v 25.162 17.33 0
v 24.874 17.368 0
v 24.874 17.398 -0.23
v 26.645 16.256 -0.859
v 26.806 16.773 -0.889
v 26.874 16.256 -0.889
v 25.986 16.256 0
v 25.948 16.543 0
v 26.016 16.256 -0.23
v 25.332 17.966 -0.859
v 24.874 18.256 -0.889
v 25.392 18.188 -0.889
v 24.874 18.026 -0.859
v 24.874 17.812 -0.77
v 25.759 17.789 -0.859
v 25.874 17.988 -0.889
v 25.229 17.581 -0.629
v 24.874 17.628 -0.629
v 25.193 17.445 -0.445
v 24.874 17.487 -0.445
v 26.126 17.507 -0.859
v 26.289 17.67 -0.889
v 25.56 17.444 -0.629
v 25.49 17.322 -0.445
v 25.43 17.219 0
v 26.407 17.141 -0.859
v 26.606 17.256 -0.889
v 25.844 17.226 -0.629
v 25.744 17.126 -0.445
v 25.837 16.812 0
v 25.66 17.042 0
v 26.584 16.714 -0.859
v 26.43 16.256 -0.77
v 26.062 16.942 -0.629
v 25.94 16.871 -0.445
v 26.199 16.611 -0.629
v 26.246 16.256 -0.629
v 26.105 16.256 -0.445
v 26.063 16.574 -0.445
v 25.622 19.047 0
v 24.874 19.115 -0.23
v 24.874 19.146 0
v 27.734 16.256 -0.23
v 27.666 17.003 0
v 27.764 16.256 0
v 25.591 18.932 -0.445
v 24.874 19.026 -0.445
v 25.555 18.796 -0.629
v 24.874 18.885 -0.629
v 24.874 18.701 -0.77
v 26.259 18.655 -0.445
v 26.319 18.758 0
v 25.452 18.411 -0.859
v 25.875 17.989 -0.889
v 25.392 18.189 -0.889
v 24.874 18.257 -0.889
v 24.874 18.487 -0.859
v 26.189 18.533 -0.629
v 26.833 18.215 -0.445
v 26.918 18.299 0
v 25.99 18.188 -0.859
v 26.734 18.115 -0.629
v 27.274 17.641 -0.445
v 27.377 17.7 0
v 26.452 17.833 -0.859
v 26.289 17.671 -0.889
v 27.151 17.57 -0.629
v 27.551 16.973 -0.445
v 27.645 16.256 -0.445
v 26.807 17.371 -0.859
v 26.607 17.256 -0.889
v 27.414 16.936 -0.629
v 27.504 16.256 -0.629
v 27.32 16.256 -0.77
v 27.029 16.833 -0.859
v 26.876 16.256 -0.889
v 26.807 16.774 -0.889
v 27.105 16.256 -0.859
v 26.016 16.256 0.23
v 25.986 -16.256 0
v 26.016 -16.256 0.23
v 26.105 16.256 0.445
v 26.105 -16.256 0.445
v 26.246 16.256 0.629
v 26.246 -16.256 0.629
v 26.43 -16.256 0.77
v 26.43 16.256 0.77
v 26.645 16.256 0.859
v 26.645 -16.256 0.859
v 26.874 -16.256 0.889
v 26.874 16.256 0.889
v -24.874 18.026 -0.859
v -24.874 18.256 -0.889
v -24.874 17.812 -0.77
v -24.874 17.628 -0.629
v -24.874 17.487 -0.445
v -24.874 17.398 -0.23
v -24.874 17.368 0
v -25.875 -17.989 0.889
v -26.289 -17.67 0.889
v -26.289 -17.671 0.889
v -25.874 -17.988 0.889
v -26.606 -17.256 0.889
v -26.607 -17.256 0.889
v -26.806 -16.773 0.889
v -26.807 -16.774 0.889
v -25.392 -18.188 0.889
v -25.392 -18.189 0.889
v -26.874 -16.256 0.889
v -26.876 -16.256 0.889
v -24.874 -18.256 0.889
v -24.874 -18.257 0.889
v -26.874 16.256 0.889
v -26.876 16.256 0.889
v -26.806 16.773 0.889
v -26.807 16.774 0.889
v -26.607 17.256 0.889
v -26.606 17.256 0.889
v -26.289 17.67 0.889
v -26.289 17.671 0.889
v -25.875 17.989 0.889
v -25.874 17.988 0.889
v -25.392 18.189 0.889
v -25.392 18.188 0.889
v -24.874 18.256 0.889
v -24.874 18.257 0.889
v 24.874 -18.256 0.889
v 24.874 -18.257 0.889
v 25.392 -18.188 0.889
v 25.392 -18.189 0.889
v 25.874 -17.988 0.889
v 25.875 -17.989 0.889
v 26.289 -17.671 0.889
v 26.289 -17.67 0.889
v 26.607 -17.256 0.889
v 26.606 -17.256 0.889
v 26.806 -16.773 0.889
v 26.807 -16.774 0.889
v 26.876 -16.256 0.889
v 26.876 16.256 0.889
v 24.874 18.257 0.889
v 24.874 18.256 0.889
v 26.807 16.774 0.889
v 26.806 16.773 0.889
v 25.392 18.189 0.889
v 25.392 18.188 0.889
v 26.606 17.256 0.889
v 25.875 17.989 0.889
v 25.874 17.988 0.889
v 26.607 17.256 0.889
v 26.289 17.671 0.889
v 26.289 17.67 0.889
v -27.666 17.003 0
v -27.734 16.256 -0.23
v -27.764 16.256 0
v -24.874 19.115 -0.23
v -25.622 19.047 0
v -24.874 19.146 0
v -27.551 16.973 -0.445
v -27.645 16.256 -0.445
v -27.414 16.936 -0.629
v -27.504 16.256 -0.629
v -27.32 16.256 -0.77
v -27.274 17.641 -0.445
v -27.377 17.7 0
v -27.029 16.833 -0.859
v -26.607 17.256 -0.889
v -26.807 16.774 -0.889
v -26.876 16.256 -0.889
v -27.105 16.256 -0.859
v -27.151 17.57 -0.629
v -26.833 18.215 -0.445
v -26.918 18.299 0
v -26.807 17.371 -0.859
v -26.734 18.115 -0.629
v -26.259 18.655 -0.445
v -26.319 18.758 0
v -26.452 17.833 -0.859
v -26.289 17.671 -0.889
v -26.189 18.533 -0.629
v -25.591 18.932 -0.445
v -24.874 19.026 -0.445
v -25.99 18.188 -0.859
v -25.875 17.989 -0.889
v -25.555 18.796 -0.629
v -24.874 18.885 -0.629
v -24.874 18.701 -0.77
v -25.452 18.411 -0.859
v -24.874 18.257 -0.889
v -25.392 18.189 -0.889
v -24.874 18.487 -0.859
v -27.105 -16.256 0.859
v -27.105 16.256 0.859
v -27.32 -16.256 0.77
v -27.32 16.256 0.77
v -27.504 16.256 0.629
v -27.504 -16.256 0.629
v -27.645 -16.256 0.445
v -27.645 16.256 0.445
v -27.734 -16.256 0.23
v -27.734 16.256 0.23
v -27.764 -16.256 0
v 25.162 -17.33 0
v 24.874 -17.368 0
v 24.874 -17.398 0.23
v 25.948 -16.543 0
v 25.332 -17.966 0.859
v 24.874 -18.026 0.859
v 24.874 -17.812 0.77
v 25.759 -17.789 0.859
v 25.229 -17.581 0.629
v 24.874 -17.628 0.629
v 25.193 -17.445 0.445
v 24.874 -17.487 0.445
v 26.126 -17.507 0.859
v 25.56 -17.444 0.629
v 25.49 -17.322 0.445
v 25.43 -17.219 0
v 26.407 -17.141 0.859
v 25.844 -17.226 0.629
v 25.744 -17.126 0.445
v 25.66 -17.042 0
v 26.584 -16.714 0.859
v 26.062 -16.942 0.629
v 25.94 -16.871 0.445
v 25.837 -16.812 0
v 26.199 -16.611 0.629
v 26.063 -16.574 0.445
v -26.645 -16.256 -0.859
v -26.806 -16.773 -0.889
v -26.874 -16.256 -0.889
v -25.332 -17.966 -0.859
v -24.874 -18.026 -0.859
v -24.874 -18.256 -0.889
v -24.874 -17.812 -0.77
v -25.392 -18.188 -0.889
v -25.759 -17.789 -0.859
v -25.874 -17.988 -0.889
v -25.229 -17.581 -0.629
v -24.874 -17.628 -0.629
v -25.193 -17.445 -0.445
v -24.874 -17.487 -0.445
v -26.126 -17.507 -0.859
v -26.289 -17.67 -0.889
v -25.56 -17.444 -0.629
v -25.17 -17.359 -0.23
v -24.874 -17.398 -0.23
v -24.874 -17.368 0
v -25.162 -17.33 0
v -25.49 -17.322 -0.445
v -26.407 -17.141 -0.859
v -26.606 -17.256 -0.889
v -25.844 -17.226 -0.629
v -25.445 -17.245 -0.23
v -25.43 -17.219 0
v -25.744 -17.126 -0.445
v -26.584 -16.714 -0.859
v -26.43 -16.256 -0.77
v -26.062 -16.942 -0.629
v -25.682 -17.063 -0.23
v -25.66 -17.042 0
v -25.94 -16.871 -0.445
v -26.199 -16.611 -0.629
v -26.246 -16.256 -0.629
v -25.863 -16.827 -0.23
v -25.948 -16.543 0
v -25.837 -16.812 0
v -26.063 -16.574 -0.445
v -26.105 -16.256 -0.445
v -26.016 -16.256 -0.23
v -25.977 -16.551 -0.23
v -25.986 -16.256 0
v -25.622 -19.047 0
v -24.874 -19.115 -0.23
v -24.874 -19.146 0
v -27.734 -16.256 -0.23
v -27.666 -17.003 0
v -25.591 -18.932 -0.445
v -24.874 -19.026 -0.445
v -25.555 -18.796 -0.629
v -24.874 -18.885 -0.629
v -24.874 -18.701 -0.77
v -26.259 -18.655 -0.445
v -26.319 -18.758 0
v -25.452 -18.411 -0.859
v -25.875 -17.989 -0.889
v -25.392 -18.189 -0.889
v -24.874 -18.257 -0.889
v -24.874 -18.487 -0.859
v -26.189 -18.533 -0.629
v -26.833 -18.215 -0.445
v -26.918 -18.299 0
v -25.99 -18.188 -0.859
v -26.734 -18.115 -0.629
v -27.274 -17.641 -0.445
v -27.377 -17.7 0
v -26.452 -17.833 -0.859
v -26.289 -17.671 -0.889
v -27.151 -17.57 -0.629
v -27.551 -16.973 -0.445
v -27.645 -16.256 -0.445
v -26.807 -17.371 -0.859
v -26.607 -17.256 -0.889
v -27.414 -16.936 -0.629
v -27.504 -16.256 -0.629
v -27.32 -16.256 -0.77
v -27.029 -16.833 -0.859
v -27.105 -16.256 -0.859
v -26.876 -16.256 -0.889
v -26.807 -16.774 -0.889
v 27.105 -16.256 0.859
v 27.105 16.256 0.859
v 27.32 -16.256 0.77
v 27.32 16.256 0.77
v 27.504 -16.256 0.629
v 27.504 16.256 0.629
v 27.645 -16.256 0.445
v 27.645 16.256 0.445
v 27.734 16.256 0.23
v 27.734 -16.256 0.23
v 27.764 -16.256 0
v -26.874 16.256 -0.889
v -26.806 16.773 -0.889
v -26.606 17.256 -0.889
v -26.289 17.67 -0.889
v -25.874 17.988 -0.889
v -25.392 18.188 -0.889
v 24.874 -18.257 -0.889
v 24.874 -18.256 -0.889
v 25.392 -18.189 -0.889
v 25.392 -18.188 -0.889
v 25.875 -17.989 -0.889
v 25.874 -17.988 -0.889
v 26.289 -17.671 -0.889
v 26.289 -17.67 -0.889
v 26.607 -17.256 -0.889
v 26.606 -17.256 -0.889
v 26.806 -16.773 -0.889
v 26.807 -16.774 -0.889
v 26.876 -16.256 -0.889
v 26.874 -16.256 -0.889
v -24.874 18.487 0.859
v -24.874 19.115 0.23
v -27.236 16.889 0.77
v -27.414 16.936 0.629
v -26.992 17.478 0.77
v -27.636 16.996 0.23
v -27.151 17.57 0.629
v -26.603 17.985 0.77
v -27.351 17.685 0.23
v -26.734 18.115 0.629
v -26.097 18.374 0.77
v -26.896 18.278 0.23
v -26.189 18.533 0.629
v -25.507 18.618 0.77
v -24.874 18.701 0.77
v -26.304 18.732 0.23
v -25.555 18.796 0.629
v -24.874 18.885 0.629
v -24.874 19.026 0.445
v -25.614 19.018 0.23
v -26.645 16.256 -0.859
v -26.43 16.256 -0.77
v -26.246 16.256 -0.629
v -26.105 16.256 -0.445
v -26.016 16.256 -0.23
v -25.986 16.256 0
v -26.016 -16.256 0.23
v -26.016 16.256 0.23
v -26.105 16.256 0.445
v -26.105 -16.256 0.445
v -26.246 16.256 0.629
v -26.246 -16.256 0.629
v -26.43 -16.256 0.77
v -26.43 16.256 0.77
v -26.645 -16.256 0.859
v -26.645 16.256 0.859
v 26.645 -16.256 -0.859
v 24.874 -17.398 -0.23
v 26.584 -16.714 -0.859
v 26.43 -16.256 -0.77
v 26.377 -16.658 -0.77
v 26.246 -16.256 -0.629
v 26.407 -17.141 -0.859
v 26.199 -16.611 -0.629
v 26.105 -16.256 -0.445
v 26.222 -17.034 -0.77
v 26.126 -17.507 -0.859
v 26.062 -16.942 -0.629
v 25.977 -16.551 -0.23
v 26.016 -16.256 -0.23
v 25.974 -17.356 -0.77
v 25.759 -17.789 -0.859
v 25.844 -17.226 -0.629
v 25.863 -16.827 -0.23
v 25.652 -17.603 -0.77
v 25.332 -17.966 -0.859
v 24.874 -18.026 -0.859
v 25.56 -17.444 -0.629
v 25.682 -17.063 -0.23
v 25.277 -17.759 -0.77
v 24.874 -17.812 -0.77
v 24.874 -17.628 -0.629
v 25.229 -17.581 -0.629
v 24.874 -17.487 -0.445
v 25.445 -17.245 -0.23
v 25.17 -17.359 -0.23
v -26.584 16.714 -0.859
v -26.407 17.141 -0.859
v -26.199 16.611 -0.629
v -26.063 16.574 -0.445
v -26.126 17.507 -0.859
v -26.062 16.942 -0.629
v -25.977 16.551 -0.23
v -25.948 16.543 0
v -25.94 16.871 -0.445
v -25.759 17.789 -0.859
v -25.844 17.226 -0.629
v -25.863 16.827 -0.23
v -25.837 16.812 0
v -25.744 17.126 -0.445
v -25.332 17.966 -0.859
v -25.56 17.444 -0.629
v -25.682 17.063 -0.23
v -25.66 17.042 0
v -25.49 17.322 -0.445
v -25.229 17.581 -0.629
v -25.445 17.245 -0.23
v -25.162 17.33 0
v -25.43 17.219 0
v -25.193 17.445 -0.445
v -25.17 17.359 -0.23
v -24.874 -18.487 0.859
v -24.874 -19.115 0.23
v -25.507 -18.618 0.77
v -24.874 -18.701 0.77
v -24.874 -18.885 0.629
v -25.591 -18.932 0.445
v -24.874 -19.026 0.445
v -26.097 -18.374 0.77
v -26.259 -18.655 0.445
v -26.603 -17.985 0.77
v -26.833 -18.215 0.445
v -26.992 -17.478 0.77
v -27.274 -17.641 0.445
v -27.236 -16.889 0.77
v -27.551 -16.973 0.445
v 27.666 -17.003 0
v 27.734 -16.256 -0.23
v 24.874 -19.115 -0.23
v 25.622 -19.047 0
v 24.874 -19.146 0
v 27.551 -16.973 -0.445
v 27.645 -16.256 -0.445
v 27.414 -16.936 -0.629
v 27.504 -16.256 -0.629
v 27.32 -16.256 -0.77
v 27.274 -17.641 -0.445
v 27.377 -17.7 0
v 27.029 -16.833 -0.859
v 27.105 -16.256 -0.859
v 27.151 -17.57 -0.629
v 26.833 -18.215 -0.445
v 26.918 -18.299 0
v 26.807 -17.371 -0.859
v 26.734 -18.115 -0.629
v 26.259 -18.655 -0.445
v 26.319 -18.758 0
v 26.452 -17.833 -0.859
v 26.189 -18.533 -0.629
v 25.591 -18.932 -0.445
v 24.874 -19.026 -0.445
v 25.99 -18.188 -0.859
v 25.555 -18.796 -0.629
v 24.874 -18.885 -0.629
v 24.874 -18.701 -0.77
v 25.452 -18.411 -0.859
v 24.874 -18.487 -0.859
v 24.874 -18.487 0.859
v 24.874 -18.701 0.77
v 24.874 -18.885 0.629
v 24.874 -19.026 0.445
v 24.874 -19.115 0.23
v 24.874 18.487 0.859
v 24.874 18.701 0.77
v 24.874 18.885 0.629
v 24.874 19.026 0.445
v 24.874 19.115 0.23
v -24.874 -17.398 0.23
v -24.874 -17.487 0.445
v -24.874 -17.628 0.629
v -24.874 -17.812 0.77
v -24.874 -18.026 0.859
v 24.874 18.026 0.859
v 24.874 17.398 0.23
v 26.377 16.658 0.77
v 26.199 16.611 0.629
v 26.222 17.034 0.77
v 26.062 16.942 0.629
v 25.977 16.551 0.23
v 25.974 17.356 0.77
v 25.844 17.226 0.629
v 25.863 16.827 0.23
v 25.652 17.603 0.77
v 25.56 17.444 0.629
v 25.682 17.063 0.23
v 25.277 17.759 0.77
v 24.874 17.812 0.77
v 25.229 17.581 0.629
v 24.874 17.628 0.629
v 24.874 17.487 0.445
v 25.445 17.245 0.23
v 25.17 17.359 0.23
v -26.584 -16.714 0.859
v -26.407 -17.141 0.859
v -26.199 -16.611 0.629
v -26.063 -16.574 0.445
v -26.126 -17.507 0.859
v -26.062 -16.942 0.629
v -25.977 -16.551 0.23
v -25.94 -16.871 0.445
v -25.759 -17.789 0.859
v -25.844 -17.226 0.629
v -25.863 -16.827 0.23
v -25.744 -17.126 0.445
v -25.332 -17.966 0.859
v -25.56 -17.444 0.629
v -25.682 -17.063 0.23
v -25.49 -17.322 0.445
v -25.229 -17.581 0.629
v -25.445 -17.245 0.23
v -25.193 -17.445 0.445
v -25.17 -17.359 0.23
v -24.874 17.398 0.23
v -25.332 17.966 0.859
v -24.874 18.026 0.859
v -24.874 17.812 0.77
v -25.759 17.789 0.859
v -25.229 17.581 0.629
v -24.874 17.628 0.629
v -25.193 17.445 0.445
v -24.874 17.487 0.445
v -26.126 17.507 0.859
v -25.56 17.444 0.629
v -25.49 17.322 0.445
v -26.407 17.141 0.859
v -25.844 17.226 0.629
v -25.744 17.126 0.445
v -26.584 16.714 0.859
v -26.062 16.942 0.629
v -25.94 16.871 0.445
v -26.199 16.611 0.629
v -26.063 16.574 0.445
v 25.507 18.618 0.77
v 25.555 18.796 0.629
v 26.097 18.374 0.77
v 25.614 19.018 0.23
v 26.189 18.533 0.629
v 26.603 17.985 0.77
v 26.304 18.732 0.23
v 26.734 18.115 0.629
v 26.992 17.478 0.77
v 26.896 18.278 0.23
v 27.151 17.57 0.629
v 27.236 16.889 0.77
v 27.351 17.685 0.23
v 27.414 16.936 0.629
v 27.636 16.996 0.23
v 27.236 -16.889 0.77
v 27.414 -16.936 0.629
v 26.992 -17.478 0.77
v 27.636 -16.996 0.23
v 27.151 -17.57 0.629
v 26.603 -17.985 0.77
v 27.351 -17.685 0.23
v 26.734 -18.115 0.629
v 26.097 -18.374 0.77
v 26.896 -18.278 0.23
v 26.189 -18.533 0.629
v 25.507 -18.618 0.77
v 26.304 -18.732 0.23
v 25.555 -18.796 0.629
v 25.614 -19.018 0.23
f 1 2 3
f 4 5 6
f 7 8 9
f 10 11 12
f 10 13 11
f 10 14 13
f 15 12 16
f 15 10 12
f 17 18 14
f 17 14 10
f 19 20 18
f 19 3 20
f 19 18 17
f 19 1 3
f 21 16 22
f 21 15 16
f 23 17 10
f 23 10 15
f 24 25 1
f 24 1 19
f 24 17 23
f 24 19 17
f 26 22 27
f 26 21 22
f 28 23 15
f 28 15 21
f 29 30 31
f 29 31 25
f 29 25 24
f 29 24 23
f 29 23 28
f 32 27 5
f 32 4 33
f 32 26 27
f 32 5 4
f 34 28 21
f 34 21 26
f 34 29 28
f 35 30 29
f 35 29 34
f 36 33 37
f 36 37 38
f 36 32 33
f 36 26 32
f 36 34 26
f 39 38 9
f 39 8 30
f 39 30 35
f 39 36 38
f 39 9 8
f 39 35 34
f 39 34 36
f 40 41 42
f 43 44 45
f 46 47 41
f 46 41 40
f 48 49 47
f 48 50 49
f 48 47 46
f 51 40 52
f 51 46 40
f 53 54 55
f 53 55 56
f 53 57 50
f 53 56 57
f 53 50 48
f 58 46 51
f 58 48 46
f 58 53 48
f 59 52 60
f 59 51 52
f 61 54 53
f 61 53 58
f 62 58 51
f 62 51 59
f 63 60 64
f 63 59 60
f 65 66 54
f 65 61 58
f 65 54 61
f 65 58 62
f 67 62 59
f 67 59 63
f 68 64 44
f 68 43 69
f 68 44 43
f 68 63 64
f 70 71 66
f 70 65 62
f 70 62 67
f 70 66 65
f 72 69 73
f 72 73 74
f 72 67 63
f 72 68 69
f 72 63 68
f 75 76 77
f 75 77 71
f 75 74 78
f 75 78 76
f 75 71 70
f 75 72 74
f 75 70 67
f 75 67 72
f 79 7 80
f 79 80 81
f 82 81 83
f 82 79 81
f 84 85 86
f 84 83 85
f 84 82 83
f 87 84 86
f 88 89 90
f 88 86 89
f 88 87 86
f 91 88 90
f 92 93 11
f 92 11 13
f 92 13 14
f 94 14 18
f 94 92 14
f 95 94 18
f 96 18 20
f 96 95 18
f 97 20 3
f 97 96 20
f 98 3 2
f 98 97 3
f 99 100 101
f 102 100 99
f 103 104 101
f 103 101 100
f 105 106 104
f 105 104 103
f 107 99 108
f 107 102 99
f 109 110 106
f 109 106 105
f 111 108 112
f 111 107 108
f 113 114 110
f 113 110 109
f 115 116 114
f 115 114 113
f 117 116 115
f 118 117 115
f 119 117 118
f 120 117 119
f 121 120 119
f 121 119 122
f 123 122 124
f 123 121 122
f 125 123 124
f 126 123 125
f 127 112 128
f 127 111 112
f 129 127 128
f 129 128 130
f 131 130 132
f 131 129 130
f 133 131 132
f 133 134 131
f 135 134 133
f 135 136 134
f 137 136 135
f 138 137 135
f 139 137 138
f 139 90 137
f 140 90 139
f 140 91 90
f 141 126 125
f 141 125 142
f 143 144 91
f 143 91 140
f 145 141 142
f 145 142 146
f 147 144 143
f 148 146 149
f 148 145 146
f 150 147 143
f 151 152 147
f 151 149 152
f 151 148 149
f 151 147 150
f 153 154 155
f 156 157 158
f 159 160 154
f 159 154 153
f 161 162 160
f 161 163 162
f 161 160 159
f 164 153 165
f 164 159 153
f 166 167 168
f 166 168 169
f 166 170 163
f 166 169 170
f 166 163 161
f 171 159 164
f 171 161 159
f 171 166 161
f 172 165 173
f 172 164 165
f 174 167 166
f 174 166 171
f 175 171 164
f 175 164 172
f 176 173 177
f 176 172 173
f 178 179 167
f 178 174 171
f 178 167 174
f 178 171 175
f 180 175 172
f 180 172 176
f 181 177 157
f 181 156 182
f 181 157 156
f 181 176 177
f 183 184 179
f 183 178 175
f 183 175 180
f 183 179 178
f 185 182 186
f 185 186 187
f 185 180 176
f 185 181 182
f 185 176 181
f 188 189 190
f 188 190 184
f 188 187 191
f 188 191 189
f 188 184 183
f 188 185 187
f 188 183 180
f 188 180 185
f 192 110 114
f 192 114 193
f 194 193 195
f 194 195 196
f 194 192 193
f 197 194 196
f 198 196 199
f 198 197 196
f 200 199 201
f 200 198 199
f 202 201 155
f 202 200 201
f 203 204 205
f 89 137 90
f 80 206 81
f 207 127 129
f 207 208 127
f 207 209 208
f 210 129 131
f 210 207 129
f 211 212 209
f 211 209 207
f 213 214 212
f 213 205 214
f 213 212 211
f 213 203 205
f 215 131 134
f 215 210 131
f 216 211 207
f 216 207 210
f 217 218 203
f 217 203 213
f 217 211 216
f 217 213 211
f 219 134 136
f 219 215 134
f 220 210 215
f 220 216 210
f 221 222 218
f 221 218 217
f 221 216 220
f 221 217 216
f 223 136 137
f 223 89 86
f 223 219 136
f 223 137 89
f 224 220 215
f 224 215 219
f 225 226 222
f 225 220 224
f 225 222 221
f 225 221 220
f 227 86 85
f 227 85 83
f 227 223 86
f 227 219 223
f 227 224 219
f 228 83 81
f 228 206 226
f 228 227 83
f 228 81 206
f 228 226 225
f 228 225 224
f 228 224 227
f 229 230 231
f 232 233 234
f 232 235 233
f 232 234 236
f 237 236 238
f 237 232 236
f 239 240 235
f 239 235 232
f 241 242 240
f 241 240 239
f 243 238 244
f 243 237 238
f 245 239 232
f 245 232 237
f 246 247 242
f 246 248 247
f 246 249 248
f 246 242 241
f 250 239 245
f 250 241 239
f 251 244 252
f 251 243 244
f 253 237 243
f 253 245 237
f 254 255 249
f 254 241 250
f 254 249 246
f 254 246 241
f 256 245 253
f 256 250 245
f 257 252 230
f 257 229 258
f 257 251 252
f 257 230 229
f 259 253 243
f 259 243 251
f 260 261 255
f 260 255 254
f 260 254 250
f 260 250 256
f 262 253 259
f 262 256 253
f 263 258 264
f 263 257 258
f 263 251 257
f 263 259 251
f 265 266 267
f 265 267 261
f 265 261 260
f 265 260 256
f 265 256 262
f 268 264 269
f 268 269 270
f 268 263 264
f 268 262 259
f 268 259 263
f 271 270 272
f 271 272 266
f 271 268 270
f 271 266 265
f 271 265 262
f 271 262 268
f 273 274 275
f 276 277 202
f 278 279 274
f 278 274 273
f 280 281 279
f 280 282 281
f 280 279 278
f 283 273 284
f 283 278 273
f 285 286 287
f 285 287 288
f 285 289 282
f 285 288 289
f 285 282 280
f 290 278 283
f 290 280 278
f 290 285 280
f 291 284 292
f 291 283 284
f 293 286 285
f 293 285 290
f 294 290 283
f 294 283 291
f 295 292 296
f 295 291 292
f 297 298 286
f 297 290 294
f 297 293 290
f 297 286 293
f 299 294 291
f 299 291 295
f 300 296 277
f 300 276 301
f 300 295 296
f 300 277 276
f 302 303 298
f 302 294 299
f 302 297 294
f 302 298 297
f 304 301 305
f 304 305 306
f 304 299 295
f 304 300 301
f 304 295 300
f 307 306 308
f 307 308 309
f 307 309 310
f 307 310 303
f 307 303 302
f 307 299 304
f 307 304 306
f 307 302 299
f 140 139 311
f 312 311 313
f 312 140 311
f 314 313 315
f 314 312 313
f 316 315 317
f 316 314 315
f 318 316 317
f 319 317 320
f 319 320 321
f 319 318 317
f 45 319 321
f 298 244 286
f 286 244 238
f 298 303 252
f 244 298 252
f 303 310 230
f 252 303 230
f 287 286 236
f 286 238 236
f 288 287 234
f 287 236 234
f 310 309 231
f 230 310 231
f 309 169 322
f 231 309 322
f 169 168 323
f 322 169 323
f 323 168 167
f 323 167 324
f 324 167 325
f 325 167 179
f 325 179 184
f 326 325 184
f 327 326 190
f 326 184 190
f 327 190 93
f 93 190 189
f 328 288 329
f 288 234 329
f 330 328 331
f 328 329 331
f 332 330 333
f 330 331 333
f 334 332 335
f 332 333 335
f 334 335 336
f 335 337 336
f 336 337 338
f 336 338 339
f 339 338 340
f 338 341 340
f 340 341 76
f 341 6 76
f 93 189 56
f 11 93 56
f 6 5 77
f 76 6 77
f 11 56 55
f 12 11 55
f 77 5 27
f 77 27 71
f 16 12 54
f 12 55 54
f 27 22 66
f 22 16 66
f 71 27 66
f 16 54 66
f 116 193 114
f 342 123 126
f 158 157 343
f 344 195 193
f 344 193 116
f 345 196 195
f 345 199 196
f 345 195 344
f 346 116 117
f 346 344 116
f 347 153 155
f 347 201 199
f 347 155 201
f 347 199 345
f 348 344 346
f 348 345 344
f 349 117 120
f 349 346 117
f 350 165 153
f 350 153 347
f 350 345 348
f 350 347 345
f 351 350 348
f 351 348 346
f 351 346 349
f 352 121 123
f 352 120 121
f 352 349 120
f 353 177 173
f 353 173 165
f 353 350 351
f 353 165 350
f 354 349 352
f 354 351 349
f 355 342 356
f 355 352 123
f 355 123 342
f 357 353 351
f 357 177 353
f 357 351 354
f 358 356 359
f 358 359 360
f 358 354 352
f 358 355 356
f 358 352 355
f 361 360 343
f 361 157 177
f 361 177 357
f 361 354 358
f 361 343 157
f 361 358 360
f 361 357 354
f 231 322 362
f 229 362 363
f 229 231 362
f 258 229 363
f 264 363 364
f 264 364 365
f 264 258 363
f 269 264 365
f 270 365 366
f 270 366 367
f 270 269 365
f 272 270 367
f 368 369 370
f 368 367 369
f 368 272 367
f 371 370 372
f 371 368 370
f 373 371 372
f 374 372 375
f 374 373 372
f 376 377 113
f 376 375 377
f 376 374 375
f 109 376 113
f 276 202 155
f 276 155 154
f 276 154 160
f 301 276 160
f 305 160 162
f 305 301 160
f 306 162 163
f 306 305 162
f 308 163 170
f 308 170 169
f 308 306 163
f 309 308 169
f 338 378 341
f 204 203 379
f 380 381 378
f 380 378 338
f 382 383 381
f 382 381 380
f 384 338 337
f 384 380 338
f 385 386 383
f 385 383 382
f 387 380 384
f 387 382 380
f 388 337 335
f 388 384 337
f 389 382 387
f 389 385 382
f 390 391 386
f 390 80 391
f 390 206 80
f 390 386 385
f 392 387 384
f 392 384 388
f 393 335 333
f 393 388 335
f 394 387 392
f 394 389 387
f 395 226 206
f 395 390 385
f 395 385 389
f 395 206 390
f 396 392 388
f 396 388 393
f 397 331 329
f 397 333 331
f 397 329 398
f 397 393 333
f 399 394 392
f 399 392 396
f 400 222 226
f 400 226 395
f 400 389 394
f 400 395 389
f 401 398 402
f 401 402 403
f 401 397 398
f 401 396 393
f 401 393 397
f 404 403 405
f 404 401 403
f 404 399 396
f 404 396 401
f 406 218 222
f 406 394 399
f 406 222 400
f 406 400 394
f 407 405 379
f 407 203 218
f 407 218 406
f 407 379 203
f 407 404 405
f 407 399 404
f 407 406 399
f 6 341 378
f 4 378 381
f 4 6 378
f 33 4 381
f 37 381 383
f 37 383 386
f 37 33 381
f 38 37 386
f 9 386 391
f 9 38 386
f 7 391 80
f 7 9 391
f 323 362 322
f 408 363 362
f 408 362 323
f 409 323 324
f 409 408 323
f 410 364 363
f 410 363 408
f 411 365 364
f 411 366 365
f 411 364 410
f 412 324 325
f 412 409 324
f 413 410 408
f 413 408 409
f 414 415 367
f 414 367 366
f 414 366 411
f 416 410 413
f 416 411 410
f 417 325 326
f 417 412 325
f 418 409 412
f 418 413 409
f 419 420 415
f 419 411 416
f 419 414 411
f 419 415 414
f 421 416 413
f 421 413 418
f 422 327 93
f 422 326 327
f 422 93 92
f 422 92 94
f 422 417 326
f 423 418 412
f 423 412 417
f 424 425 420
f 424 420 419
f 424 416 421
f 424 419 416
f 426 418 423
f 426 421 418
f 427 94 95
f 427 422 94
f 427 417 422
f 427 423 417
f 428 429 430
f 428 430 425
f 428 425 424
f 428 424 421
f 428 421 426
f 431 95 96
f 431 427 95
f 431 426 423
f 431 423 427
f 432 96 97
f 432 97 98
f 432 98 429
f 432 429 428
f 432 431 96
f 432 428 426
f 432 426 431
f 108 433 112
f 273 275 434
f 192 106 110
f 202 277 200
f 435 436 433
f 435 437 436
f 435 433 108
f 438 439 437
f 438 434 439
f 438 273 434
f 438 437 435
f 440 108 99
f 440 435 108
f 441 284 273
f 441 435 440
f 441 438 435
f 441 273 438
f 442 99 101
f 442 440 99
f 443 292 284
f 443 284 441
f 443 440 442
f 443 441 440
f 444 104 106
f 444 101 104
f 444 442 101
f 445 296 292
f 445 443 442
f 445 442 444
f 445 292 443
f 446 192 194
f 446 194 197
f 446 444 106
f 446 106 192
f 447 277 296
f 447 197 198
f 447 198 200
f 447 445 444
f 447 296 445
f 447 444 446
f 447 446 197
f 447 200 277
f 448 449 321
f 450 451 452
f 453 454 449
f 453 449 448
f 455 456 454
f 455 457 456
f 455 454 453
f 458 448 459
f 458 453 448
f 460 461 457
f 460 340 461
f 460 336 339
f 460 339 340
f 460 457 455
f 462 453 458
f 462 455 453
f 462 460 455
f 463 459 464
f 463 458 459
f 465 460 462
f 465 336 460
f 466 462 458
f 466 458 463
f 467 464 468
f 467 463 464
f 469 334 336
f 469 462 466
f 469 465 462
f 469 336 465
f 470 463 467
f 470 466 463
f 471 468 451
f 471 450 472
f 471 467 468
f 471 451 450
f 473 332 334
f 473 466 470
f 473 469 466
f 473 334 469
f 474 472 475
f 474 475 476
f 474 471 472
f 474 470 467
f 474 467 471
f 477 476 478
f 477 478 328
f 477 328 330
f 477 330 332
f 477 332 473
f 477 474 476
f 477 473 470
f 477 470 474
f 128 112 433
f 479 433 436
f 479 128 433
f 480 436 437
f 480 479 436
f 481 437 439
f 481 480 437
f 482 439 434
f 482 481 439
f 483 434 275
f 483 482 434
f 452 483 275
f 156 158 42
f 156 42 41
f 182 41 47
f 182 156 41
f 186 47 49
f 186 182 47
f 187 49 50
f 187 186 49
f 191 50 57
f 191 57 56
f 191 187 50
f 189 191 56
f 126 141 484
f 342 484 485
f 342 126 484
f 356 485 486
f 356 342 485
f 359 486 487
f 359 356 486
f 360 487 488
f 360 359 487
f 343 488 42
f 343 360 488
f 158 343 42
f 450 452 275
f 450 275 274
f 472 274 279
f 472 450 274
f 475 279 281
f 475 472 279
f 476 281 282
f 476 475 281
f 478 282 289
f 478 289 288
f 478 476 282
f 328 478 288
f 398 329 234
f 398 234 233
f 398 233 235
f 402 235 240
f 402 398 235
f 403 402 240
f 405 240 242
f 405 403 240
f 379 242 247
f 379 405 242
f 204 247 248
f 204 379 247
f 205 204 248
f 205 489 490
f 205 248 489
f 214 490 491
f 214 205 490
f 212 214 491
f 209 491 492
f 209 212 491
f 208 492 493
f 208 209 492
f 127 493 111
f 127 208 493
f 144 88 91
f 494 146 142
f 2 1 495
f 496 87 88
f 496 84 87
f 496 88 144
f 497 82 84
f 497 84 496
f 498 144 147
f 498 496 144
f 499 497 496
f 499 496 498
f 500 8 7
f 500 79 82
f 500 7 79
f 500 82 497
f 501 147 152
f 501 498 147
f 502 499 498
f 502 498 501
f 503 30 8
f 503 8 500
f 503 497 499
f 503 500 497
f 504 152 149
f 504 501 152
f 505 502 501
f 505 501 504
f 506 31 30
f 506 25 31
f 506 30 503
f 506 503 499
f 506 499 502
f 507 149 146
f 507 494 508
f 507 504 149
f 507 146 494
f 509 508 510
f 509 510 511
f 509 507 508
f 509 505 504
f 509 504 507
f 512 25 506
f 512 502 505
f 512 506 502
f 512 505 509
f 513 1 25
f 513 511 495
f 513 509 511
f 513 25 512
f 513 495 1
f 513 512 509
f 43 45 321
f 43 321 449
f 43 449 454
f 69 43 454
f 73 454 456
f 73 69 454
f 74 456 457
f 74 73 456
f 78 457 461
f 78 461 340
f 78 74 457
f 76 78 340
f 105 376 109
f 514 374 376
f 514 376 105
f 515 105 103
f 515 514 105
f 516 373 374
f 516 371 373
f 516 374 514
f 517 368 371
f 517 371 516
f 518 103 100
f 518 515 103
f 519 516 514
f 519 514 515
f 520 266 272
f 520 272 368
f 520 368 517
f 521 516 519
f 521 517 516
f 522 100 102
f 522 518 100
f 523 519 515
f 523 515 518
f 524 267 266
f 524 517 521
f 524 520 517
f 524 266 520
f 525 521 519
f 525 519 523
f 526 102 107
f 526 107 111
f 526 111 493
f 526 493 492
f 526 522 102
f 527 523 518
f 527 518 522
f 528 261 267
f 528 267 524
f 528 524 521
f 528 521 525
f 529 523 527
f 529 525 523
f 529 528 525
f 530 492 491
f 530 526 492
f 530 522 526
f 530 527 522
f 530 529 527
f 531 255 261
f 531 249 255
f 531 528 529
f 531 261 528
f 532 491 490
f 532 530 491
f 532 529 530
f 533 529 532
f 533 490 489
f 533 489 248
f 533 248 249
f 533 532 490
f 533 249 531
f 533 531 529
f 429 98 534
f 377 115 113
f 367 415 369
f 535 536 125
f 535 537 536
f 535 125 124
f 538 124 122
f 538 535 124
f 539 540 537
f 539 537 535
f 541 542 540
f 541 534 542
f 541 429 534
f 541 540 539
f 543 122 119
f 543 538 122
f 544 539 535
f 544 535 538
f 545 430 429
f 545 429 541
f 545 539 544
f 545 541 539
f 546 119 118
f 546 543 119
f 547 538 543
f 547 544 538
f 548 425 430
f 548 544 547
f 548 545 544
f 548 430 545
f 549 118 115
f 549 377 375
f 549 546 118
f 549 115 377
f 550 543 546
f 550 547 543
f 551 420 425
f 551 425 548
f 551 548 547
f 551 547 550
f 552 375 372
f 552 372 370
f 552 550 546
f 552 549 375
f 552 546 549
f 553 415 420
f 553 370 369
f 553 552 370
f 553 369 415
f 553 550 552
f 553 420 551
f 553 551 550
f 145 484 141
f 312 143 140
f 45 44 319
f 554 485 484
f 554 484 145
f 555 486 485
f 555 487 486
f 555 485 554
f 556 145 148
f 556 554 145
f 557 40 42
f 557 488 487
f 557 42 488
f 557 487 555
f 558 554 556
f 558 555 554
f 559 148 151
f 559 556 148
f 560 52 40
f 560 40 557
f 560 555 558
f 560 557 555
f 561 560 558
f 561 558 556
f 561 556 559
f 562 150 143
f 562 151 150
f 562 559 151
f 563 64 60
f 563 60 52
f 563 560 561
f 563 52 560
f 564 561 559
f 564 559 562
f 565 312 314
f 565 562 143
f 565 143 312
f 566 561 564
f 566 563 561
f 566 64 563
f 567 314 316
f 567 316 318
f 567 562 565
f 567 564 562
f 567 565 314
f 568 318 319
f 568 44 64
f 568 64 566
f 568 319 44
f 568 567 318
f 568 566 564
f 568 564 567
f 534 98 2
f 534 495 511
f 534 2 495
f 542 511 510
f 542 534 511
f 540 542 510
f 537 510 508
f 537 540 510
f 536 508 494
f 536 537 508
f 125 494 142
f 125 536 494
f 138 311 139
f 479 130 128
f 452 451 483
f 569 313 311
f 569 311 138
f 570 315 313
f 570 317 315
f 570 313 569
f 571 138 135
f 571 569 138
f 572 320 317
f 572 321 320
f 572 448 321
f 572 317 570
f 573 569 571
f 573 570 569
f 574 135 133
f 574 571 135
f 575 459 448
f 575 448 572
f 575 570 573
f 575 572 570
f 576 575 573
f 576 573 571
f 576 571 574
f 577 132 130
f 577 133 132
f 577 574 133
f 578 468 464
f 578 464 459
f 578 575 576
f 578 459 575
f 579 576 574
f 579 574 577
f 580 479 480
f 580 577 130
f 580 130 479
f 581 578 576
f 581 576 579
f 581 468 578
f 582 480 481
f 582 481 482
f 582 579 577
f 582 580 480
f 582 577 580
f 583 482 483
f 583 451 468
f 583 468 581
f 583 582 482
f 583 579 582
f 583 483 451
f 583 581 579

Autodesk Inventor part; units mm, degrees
ref_plane "YZ Plane" through (0, 0, 0) normal (1, 0, 0) x (0, 1, 0)
ref_plane "XZ Plane" through (0, 0, 0) normal (0, 1, 0) x (-1, 0, 0)
ref_plane "XY Plane" through (0, 0, 0) normal (0, 0, 1) x (1, 0, 0)
sketch "Sketch1" plane through (0, 0, 0) normal (0, 0, 1) x (1, 0, 0)
  line L0 (-26.875, -18.2565) -> (26.875, -18.2565) construction
  line L1 (26.875, -18.2565) -> (26.875, 18.2565) construction
  line L2 (26.875, 18.2565) -> (-26.875, 18.2565) construction
  line L3 (-26.875, 18.2565) -> (-26.875, -18.2565) construction
  line L4 (-27.764, 19.1455) -> (27.764, 19.1455)
  line L5 (27.764, 19.1455) -> (27.764, -19.1455)
  line L6 (27.764, -19.1455) -> (-27.764, -19.1455)
  line L7 (-27.764, -19.1455) -> (-27.764, 19.1455)
  line L8 (-25.986, 17.3675) -> (25.986, 17.3675)
  line L9 (25.986, 17.3675) -> (25.986, -17.3675)
  line L10 (25.986, -17.3675) -> (-25.986, -17.3675)
  line L11 (-25.986, -17.3675) -> (-25.986, 17.3675)
  point P0 (0, 0)
  point P1 (0, 18.2565)
  point P2 (-26.875, 0)
  dimension "d0" = 53.75
  dimension "d1" = 36.513
  dimension "d2" = 0.889
  dimension "d3" = 0.889
extrude "Extrusion1" add sketch "Sketch1" along normal mid plane 1.778
fillet "Fillet1" radius 2.89 4 edges at (27.764, 19.1455, 0) (27.764, -19.1455, 0) (-27.764, -19.1455, 0) (-27.764, 19.1455, 0)
sketch "Sketch2" plane through (0, 0, 0.889) normal (0, 0, 1) x (1, 0, 0)
  arc A0 (-24.874, 19.1455) -> (-27.764, 16.2555) centre (-24.874, 16.2555) ccw projected
  line L0 (-27.764, 16.2555) -> (-27.764, -16.2555) projected
  arc A1 (-27.764, -16.2555) -> (-24.874, -19.1455) centre (-24.874, -16.2555) ccw projected
  line L1 (-24.874, -19.1455) -> (24.874, -19.1455) projected
  arc A2 (24.874, -19.1455) -> (27.764, -16.2555) centre (24.874, -16.2555) ccw projected
  line L2 (27.764, -16.2555) -> (27.764, 16.2555) projected
  arc A3 (27.764, 16.2555) -> (24.874, 19.1455) centre (24.874, 16.2555) ccw projected
  line L3 (24.874, 19.1455) -> (-24.874, 19.1455) projected
  line L4 (-25.986, -17.3675) -> (-25.986, 17.3675) projected
  line L5 (-25.986, 17.3675) -> (25.986, 17.3675) projected
  line L6 (25.986, 17.3675) -> (25.986, -17.3675) projected
  line L7 (25.986, -17.3675) -> (-25.986, -17.3675) projected
  line L8 (-25.986, 17.3675) -> (25.986, 17.3675) projected
  arc A4 (-24.874, 17.3675) -> (-25.986, 16.2555) centre (-24.874, 16.2555) ccw
  line L9 (25.986, 17.3675) -> (25.986, -17.3675) projected
  arc A5 (25.986, 16.2555) -> (24.874, 17.3675) centre (24.874, 16.2555) ccw
  line L10 (-25.986, -17.3675) -> (-25.986, 17.3675) projected
  line L11 (25.986, -17.3675) -> (-25.986, -17.3675) projected
  arc A6 (-25.986, -16.2555) -> (-24.874, -17.3675) centre (-24.874, -16.2555) ccw
  arc A7 (24.874, -17.3675) -> (25.986, -16.2555) centre (24.874, -16.2555) ccw
  point P0 (0, 0)
  point P1 (24.874, 17.3675)
  point P2 (25.986, 16.2555)
  point P3 (-25.986, -16.2555)
  point P4 (-24.874, 17.3675)
extrude "Extrusion2" add sketch "Sketch2" against normal blind 1.778 contours L4 A6 L7 | L4 L5 A4 | A7 L6 L7 | L5 L6 A5
fillet "Fillet2" radius 0.889 32 edges at (25.6603, 17.0418, 0.889) (25.986, 0, 0.889) (25.6603, -17.0418, 0.889) (0, -17.3675, 0.889) (-25.6603, -17.0418, 0.889) (-25.986, 0, 0.889) (-25.6603, 17.0418, 0.889) (0, 17.3675, 0.889) (-26.9175, -18.299, 0.889) (0, -19.1455, 0.889) (26.9175, -18.299, 0.889) (27.764, 0, 0.889) (26.9175, 18.299, 0.889) (0, 19.1455, 0.889) (-26.9175, 18.299, 0.889) (-27.764, 0, 0.889) (-26.9175, 18.299, -0.889) (0, 19.1455, -0.889) (26.9175, 18.299, -0.889) (27.764, 0, -0.889) (26.9175, -18.299, -0.889) (0, -19.1455, -0.889) (-26.9175, -18.299, -0.889) (-27.764, 0, -0.889) (-25.6603, -17.0418, -0.889) (0, -17.3675, -0.889) (25.6603, -17.0418, -0.889) (25.986, 0, -0.889) (25.6603, 17.0418, -0.889) (0, 17.3675, -0.889) (-25.6603, 17.0418, -0.889) (-25.986, 0, -0.889)
equation "\"d3\" = d2"
equation "\"d4\" = 2 * d2"
equation "\"d7\" = 2 * d2"
equation "\"d9\" = d2"
properties part number "O-RING DASH 034"
